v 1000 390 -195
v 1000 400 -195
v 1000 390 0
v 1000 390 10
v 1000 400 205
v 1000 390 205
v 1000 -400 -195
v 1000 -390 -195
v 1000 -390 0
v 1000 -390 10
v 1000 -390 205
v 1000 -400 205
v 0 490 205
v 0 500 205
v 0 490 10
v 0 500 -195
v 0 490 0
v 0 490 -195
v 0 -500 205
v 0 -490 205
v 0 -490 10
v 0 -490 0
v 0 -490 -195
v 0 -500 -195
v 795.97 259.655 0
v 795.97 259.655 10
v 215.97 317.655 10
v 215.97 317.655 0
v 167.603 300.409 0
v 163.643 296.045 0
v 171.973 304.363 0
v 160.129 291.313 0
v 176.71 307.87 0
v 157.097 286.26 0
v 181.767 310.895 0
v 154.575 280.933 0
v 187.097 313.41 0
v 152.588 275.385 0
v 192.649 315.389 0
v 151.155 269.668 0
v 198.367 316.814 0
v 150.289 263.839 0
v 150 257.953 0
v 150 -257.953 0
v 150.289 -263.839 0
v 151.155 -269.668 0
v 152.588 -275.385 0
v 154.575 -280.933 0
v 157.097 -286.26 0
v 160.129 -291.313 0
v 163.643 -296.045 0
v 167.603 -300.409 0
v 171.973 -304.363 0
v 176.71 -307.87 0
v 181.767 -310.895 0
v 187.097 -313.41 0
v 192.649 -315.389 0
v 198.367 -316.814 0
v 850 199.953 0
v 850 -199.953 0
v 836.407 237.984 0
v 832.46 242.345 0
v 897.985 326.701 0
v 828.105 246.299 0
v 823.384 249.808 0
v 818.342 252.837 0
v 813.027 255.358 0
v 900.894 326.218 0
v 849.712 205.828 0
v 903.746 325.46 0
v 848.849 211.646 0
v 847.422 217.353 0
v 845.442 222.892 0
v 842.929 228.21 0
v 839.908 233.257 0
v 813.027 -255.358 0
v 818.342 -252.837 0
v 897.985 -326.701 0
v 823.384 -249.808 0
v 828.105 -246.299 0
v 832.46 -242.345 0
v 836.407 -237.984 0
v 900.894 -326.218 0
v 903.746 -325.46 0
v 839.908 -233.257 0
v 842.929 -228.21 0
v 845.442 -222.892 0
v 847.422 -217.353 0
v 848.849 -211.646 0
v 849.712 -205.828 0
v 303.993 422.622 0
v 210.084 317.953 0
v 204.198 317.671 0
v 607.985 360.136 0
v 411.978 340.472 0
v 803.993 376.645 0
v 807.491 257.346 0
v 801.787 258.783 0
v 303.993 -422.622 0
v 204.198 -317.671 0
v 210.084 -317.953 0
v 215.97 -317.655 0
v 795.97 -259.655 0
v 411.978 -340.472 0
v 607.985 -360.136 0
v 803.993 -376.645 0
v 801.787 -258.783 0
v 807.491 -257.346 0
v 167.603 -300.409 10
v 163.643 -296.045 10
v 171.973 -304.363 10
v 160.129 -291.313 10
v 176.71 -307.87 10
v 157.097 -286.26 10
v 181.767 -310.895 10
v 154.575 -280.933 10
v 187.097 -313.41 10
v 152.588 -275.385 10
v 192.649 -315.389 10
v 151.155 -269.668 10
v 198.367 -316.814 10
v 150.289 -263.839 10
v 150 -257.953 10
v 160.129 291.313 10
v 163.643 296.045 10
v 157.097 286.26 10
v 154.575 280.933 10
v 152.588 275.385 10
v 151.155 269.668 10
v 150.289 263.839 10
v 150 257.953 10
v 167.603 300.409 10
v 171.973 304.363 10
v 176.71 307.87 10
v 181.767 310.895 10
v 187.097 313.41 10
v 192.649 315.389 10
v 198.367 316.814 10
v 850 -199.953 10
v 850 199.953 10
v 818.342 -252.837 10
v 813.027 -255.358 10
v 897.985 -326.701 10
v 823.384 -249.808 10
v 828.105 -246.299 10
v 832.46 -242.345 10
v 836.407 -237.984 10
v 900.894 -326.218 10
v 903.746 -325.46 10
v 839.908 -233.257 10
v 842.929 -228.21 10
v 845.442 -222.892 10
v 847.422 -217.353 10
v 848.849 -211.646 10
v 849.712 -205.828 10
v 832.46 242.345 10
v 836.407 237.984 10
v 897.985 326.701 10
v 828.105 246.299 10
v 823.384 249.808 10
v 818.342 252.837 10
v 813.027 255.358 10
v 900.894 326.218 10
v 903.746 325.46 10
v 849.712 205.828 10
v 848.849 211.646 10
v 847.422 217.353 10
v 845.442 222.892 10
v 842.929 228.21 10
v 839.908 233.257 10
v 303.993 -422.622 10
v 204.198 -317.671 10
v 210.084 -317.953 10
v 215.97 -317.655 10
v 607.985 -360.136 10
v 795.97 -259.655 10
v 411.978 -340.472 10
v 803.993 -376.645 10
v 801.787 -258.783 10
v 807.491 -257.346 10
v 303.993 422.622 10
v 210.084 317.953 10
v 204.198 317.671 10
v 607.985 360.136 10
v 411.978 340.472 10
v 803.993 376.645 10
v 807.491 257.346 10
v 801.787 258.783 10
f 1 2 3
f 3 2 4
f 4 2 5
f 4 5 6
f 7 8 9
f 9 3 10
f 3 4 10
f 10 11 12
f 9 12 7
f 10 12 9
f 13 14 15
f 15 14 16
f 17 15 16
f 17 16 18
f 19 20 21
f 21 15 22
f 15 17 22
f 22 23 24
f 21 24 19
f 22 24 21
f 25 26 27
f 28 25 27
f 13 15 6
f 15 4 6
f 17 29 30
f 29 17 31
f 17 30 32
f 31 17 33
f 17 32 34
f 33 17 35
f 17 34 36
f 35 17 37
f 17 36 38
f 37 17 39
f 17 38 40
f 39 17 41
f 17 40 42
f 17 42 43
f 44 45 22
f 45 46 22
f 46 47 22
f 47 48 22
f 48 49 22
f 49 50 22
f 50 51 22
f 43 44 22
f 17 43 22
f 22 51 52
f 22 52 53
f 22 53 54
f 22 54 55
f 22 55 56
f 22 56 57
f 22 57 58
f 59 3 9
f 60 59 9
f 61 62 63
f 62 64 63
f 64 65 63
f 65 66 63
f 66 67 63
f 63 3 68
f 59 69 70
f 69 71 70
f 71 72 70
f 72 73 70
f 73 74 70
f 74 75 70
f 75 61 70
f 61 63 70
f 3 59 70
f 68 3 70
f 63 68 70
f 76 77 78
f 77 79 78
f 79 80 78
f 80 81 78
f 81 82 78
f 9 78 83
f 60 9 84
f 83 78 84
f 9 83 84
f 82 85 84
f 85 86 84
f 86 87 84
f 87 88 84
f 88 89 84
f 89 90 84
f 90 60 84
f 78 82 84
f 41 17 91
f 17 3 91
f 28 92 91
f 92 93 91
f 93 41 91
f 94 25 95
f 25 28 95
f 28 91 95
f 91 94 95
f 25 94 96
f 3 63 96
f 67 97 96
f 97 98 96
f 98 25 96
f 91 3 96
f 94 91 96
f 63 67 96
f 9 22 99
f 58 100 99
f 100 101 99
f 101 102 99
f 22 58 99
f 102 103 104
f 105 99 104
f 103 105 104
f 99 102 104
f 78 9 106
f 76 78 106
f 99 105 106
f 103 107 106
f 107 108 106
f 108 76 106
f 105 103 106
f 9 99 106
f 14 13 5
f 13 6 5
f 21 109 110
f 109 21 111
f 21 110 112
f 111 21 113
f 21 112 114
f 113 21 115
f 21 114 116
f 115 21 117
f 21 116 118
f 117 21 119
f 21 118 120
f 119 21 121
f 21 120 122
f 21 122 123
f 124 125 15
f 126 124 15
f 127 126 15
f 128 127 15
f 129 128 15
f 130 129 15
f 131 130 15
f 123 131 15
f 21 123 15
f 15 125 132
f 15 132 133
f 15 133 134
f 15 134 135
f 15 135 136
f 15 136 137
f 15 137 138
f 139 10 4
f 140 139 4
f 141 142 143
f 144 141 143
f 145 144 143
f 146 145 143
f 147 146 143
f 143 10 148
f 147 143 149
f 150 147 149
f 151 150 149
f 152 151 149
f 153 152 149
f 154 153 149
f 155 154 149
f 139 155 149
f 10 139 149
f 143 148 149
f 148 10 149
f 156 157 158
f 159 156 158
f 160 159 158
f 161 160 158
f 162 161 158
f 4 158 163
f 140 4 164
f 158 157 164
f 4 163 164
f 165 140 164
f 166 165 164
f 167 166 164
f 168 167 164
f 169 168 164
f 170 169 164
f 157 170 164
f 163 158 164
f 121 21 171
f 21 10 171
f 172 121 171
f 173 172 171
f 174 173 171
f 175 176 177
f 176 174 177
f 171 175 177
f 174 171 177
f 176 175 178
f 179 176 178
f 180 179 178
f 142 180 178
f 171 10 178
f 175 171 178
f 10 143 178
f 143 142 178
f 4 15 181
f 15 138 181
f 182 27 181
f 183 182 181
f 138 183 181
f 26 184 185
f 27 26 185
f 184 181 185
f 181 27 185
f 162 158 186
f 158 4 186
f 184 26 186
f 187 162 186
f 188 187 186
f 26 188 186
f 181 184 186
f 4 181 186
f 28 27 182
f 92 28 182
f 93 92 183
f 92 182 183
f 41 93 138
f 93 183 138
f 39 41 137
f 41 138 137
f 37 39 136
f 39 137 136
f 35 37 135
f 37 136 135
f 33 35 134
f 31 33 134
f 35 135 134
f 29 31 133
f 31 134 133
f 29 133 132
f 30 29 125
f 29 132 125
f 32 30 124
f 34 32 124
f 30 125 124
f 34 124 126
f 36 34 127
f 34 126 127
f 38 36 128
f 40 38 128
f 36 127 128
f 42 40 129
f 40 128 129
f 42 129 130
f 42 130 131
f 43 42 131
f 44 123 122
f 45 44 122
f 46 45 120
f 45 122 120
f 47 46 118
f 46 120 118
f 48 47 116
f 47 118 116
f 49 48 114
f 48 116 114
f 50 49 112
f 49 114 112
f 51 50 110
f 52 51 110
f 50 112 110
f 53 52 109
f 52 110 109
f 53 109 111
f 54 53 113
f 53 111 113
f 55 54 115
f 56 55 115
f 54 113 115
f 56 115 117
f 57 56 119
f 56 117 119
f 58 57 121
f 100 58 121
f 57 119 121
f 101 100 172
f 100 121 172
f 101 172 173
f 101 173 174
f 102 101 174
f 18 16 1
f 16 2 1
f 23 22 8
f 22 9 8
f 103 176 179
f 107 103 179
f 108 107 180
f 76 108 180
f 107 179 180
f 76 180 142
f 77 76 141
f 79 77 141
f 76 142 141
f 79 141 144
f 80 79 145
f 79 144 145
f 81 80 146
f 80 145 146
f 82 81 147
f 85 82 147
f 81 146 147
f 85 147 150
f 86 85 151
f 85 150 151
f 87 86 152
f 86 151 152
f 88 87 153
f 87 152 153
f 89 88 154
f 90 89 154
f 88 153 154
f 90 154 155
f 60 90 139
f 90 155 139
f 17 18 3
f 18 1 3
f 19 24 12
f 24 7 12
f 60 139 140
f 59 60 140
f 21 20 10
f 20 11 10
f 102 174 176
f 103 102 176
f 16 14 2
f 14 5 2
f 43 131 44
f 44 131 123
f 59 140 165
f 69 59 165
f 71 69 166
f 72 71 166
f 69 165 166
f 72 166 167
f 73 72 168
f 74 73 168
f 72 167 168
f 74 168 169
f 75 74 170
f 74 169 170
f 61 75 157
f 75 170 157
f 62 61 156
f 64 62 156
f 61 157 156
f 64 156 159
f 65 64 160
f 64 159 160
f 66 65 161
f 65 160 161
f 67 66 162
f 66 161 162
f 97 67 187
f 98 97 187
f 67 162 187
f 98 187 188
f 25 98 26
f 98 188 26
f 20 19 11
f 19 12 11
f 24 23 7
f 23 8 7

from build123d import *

# Parameters (mm, degrees)
CUT_EXTRUDE1_DEPTH = 10


with BuildPart() as part:
    # Sketch1 → Loft4 section 0
    with BuildSketch(Plane(origin=(0, 0, 0), x_dir=(0, 0, -1), z_dir=(1, 0, 0))):
        Polygon((-205, 500), (195, 500), (195, 490), (0, 490), (0, -490), (195, -490), (195, -500), (-205, -500), (-205, -490), (-10, -490), (-10, 490), (-205, 490), align=None)
    # Sketch4 → Loft4 section 1
    with BuildSketch(Plane(origin=(1000, 0, -1000), x_dir=(0, 0, 1), z_dir=(-1, 0, 0))):
        Polygon((805, 400), (1205, 400), (1205, 390), (1010, 390), (1010, -390), (1205, -390), (1205, -400), (805, -400), (805, -390), (1000, -390), (1000, 390), (805, 390), align=None)
    loft()

    # Sketch6 → Cut-Extrude1 (cut)
    with BuildSketch(Plane.XY.offset(10)):
        with BuildLine():
            Line((215.970223141, -317.654843369), (795.970223141, -259.654843369))
            ThreePointArc((795.970223141, -259.654843369), (834.487152013, -240.212931202), (850, -199.952611956))
            Line((850, -199.952611956), (850, 199.952611956))
            ThreePointArc((850, 199.952611956), (834.487152013, 240.212931202), (795.970223141, 259.654843369))
            Line((795.970223141, 259.654843369), (215.970223141, 317.654843369))
            ThreePointArc((215.970223141, 317.654843369), (169.739680754, 302.43976397), (150, 257.952611956))
            Line((150, 257.952611956), (150, -257.952611956))
            ThreePointArc((150, -257.952611956), (169.739680754, -302.43976397), (215.970223141, -317.654843369))
        make_face()
    extrude(amount=-CUT_EXTRUDE1_DEPTH, mode=Mode.SUBTRACT)


solid = part.part
